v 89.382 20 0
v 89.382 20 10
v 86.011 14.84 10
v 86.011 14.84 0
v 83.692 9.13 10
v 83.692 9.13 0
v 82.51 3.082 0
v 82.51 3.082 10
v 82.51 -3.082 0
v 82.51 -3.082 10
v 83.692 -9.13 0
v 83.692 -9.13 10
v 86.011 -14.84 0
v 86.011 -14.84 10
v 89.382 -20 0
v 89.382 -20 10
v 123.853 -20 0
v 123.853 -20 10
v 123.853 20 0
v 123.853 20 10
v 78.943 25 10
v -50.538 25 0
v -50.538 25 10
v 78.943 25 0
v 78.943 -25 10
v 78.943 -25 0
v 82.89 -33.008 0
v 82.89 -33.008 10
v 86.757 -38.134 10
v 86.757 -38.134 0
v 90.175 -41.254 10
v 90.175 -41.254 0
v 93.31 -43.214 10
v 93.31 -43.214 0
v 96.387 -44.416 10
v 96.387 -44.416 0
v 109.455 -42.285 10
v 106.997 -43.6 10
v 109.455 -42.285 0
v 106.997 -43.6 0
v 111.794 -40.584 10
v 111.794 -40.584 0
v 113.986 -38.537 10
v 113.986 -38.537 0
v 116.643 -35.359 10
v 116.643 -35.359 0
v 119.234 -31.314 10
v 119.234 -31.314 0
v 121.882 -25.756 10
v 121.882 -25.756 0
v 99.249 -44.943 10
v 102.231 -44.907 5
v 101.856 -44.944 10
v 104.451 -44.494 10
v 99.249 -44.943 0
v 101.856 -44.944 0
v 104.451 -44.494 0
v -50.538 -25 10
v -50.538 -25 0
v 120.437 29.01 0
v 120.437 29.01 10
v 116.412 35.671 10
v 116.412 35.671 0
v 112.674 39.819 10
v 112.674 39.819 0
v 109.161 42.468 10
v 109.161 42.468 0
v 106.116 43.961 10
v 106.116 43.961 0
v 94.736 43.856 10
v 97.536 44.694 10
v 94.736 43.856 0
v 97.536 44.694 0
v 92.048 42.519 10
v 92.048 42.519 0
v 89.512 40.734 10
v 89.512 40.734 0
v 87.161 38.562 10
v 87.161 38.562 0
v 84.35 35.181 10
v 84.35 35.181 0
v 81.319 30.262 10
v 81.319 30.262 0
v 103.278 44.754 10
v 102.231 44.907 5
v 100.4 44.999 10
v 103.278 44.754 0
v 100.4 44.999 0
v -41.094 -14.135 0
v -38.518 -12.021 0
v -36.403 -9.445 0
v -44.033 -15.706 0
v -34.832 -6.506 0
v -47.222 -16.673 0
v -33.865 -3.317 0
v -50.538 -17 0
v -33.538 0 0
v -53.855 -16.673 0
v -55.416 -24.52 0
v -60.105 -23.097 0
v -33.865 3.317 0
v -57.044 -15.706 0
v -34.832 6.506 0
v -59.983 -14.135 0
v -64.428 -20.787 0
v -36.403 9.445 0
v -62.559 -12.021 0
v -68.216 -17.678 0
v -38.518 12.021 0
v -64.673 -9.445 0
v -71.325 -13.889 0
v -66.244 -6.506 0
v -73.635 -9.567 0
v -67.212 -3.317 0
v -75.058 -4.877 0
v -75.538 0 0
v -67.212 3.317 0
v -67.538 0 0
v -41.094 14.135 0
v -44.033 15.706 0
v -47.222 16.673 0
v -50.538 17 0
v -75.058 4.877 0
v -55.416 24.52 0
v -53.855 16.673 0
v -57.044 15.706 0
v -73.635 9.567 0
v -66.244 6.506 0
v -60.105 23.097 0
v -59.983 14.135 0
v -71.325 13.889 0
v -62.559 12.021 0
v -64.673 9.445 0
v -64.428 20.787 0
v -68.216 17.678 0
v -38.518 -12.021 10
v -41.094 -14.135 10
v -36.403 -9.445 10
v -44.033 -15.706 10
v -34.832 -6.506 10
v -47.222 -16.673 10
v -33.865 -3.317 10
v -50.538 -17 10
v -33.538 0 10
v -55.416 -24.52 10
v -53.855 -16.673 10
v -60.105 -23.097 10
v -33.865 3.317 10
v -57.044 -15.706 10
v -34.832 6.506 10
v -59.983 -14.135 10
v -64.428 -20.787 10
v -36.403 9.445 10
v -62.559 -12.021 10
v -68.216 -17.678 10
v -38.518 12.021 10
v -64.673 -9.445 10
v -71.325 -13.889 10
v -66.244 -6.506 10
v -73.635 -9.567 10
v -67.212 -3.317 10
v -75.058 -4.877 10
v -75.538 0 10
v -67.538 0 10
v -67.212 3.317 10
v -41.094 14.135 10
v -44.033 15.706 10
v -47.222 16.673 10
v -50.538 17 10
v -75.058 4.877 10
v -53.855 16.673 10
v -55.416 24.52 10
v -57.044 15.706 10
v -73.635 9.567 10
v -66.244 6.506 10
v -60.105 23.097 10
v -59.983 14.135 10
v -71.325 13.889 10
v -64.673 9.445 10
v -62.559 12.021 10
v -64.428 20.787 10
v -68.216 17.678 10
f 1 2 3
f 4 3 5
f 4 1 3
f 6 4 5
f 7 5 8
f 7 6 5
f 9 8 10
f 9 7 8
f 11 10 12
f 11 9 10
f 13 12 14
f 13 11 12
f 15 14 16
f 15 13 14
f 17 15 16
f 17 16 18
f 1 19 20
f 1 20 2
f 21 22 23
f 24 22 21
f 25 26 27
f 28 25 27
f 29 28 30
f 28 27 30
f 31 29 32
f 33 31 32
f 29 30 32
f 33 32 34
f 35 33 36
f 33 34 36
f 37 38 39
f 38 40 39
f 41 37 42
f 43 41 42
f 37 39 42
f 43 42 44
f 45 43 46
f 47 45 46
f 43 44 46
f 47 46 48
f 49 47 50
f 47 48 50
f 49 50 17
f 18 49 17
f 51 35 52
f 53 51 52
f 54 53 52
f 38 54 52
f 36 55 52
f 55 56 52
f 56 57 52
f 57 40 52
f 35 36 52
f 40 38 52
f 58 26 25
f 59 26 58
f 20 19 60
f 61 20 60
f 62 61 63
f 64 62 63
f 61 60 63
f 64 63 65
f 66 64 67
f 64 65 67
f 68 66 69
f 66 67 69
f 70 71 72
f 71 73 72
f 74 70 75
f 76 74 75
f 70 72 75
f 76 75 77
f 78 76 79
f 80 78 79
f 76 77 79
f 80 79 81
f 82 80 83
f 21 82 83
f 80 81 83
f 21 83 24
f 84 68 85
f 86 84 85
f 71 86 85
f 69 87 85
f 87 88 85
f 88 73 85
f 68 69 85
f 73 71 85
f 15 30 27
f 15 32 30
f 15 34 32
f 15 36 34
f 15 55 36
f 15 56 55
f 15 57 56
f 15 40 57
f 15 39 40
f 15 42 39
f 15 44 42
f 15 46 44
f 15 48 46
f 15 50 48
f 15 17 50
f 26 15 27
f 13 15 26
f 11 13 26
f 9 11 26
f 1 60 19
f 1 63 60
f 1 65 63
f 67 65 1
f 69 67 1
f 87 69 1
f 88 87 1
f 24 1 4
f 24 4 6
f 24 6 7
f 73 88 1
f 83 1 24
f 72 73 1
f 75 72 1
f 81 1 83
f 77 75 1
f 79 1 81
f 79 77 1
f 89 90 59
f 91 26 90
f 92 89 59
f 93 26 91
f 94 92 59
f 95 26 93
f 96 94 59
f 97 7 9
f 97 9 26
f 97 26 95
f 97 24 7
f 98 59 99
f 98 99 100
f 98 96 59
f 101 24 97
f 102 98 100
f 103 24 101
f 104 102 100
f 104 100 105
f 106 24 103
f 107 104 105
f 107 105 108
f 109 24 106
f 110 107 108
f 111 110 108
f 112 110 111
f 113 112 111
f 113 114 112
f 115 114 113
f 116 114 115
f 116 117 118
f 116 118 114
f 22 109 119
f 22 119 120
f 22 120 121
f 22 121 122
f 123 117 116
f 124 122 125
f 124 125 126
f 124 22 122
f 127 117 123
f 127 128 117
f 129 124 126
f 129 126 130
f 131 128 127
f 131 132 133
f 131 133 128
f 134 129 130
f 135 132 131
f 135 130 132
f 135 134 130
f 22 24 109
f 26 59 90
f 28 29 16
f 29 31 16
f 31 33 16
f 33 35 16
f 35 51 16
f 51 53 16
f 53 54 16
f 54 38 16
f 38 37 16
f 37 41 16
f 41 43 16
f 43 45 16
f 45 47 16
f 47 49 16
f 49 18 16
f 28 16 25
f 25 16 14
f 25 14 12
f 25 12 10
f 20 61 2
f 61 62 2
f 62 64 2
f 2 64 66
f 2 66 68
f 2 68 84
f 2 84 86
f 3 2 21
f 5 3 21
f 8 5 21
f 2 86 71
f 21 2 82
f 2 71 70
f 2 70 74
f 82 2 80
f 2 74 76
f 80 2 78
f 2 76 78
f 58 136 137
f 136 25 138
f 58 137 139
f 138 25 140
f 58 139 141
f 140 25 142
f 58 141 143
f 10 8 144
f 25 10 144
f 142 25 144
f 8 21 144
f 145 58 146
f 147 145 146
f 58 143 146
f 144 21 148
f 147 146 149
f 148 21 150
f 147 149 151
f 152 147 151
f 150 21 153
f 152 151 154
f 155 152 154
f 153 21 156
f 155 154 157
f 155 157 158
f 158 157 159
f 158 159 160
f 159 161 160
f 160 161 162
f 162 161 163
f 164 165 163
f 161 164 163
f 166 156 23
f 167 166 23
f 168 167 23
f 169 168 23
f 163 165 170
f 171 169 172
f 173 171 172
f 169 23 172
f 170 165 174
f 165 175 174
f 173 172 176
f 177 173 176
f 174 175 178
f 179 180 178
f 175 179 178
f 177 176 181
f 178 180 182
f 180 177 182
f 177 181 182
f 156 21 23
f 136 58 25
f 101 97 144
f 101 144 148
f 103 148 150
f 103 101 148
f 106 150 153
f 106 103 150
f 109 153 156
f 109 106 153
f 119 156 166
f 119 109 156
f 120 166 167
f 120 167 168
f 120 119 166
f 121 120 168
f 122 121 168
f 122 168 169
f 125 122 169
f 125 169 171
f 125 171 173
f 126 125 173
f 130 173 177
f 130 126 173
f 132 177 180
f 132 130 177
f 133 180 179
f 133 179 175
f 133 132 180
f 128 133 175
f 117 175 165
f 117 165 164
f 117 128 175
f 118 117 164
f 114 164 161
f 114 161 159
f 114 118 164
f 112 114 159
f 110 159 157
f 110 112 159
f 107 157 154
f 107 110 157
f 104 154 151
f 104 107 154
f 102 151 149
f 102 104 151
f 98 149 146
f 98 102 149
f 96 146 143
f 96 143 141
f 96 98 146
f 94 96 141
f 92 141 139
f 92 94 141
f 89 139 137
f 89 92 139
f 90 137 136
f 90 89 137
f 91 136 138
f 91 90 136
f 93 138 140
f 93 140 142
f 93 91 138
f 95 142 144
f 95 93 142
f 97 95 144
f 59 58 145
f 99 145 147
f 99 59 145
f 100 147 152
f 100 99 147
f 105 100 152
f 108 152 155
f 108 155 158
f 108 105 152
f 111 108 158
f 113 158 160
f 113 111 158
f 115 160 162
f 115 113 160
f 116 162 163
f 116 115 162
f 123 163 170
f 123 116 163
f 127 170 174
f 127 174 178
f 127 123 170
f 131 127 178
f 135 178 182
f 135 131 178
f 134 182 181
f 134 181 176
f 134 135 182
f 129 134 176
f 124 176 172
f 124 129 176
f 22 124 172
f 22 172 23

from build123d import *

# Parameters (mm, degrees)
IZIM1_R                     = 17
Y_KSEKLIK_EKSTR_ZYON1_DEPTH = 10


with BuildPart() as part:
    # Çizim1 → Yükseklik-Ekstrüzyon1 (new body)
    with BuildSketch(Plane.XY):
        with BuildLine():
            Line((-50.538386463, 25), (78.943148636, 25))
            add(Edge.make_bspline(
                [(123.852580365, 20), (103.89283293, 89.629118064), (78.943148636, 25)],
                knots=[5.172942972, 5.172942972, 5.172942972, 7.264950664, 7.264950664, 7.264950664], degree=2, weights=[1, 0.501033423, 1]))
            Line((123.852580365, 20), (89.381621543, 20))
            ThreePointArc((89.381621543, 20), (82.361613537, 0), (89.381621543, -20))
            Line((89.381621543, -20), (123.852580365, -20))
            add(Edge.make_bspline(
                [(78.943148636, -25), (103.89283293, -89.629118064), (123.852580365, -20)],
                knots=[2.159827297, 2.159827297, 2.159827297, 4.251834989, 4.251834989, 4.251834989], degree=2, weights=[1, 0.501033423, 1]))
            Line((78.943148636, -25), (-50.538386463, -25))
            ThreePointArc((-50.538386463, -25), (-75.538386463, 0), (-50.538386463, 25))
        make_face()
        with Locations((-50.538386463, 0)):
            Circle(IZIM1_R, mode=Mode.SUBTRACT)
    extrude(amount=Y_KSEKLIK_EKSTR_ZYON1_DEPTH)


solid = part.part
